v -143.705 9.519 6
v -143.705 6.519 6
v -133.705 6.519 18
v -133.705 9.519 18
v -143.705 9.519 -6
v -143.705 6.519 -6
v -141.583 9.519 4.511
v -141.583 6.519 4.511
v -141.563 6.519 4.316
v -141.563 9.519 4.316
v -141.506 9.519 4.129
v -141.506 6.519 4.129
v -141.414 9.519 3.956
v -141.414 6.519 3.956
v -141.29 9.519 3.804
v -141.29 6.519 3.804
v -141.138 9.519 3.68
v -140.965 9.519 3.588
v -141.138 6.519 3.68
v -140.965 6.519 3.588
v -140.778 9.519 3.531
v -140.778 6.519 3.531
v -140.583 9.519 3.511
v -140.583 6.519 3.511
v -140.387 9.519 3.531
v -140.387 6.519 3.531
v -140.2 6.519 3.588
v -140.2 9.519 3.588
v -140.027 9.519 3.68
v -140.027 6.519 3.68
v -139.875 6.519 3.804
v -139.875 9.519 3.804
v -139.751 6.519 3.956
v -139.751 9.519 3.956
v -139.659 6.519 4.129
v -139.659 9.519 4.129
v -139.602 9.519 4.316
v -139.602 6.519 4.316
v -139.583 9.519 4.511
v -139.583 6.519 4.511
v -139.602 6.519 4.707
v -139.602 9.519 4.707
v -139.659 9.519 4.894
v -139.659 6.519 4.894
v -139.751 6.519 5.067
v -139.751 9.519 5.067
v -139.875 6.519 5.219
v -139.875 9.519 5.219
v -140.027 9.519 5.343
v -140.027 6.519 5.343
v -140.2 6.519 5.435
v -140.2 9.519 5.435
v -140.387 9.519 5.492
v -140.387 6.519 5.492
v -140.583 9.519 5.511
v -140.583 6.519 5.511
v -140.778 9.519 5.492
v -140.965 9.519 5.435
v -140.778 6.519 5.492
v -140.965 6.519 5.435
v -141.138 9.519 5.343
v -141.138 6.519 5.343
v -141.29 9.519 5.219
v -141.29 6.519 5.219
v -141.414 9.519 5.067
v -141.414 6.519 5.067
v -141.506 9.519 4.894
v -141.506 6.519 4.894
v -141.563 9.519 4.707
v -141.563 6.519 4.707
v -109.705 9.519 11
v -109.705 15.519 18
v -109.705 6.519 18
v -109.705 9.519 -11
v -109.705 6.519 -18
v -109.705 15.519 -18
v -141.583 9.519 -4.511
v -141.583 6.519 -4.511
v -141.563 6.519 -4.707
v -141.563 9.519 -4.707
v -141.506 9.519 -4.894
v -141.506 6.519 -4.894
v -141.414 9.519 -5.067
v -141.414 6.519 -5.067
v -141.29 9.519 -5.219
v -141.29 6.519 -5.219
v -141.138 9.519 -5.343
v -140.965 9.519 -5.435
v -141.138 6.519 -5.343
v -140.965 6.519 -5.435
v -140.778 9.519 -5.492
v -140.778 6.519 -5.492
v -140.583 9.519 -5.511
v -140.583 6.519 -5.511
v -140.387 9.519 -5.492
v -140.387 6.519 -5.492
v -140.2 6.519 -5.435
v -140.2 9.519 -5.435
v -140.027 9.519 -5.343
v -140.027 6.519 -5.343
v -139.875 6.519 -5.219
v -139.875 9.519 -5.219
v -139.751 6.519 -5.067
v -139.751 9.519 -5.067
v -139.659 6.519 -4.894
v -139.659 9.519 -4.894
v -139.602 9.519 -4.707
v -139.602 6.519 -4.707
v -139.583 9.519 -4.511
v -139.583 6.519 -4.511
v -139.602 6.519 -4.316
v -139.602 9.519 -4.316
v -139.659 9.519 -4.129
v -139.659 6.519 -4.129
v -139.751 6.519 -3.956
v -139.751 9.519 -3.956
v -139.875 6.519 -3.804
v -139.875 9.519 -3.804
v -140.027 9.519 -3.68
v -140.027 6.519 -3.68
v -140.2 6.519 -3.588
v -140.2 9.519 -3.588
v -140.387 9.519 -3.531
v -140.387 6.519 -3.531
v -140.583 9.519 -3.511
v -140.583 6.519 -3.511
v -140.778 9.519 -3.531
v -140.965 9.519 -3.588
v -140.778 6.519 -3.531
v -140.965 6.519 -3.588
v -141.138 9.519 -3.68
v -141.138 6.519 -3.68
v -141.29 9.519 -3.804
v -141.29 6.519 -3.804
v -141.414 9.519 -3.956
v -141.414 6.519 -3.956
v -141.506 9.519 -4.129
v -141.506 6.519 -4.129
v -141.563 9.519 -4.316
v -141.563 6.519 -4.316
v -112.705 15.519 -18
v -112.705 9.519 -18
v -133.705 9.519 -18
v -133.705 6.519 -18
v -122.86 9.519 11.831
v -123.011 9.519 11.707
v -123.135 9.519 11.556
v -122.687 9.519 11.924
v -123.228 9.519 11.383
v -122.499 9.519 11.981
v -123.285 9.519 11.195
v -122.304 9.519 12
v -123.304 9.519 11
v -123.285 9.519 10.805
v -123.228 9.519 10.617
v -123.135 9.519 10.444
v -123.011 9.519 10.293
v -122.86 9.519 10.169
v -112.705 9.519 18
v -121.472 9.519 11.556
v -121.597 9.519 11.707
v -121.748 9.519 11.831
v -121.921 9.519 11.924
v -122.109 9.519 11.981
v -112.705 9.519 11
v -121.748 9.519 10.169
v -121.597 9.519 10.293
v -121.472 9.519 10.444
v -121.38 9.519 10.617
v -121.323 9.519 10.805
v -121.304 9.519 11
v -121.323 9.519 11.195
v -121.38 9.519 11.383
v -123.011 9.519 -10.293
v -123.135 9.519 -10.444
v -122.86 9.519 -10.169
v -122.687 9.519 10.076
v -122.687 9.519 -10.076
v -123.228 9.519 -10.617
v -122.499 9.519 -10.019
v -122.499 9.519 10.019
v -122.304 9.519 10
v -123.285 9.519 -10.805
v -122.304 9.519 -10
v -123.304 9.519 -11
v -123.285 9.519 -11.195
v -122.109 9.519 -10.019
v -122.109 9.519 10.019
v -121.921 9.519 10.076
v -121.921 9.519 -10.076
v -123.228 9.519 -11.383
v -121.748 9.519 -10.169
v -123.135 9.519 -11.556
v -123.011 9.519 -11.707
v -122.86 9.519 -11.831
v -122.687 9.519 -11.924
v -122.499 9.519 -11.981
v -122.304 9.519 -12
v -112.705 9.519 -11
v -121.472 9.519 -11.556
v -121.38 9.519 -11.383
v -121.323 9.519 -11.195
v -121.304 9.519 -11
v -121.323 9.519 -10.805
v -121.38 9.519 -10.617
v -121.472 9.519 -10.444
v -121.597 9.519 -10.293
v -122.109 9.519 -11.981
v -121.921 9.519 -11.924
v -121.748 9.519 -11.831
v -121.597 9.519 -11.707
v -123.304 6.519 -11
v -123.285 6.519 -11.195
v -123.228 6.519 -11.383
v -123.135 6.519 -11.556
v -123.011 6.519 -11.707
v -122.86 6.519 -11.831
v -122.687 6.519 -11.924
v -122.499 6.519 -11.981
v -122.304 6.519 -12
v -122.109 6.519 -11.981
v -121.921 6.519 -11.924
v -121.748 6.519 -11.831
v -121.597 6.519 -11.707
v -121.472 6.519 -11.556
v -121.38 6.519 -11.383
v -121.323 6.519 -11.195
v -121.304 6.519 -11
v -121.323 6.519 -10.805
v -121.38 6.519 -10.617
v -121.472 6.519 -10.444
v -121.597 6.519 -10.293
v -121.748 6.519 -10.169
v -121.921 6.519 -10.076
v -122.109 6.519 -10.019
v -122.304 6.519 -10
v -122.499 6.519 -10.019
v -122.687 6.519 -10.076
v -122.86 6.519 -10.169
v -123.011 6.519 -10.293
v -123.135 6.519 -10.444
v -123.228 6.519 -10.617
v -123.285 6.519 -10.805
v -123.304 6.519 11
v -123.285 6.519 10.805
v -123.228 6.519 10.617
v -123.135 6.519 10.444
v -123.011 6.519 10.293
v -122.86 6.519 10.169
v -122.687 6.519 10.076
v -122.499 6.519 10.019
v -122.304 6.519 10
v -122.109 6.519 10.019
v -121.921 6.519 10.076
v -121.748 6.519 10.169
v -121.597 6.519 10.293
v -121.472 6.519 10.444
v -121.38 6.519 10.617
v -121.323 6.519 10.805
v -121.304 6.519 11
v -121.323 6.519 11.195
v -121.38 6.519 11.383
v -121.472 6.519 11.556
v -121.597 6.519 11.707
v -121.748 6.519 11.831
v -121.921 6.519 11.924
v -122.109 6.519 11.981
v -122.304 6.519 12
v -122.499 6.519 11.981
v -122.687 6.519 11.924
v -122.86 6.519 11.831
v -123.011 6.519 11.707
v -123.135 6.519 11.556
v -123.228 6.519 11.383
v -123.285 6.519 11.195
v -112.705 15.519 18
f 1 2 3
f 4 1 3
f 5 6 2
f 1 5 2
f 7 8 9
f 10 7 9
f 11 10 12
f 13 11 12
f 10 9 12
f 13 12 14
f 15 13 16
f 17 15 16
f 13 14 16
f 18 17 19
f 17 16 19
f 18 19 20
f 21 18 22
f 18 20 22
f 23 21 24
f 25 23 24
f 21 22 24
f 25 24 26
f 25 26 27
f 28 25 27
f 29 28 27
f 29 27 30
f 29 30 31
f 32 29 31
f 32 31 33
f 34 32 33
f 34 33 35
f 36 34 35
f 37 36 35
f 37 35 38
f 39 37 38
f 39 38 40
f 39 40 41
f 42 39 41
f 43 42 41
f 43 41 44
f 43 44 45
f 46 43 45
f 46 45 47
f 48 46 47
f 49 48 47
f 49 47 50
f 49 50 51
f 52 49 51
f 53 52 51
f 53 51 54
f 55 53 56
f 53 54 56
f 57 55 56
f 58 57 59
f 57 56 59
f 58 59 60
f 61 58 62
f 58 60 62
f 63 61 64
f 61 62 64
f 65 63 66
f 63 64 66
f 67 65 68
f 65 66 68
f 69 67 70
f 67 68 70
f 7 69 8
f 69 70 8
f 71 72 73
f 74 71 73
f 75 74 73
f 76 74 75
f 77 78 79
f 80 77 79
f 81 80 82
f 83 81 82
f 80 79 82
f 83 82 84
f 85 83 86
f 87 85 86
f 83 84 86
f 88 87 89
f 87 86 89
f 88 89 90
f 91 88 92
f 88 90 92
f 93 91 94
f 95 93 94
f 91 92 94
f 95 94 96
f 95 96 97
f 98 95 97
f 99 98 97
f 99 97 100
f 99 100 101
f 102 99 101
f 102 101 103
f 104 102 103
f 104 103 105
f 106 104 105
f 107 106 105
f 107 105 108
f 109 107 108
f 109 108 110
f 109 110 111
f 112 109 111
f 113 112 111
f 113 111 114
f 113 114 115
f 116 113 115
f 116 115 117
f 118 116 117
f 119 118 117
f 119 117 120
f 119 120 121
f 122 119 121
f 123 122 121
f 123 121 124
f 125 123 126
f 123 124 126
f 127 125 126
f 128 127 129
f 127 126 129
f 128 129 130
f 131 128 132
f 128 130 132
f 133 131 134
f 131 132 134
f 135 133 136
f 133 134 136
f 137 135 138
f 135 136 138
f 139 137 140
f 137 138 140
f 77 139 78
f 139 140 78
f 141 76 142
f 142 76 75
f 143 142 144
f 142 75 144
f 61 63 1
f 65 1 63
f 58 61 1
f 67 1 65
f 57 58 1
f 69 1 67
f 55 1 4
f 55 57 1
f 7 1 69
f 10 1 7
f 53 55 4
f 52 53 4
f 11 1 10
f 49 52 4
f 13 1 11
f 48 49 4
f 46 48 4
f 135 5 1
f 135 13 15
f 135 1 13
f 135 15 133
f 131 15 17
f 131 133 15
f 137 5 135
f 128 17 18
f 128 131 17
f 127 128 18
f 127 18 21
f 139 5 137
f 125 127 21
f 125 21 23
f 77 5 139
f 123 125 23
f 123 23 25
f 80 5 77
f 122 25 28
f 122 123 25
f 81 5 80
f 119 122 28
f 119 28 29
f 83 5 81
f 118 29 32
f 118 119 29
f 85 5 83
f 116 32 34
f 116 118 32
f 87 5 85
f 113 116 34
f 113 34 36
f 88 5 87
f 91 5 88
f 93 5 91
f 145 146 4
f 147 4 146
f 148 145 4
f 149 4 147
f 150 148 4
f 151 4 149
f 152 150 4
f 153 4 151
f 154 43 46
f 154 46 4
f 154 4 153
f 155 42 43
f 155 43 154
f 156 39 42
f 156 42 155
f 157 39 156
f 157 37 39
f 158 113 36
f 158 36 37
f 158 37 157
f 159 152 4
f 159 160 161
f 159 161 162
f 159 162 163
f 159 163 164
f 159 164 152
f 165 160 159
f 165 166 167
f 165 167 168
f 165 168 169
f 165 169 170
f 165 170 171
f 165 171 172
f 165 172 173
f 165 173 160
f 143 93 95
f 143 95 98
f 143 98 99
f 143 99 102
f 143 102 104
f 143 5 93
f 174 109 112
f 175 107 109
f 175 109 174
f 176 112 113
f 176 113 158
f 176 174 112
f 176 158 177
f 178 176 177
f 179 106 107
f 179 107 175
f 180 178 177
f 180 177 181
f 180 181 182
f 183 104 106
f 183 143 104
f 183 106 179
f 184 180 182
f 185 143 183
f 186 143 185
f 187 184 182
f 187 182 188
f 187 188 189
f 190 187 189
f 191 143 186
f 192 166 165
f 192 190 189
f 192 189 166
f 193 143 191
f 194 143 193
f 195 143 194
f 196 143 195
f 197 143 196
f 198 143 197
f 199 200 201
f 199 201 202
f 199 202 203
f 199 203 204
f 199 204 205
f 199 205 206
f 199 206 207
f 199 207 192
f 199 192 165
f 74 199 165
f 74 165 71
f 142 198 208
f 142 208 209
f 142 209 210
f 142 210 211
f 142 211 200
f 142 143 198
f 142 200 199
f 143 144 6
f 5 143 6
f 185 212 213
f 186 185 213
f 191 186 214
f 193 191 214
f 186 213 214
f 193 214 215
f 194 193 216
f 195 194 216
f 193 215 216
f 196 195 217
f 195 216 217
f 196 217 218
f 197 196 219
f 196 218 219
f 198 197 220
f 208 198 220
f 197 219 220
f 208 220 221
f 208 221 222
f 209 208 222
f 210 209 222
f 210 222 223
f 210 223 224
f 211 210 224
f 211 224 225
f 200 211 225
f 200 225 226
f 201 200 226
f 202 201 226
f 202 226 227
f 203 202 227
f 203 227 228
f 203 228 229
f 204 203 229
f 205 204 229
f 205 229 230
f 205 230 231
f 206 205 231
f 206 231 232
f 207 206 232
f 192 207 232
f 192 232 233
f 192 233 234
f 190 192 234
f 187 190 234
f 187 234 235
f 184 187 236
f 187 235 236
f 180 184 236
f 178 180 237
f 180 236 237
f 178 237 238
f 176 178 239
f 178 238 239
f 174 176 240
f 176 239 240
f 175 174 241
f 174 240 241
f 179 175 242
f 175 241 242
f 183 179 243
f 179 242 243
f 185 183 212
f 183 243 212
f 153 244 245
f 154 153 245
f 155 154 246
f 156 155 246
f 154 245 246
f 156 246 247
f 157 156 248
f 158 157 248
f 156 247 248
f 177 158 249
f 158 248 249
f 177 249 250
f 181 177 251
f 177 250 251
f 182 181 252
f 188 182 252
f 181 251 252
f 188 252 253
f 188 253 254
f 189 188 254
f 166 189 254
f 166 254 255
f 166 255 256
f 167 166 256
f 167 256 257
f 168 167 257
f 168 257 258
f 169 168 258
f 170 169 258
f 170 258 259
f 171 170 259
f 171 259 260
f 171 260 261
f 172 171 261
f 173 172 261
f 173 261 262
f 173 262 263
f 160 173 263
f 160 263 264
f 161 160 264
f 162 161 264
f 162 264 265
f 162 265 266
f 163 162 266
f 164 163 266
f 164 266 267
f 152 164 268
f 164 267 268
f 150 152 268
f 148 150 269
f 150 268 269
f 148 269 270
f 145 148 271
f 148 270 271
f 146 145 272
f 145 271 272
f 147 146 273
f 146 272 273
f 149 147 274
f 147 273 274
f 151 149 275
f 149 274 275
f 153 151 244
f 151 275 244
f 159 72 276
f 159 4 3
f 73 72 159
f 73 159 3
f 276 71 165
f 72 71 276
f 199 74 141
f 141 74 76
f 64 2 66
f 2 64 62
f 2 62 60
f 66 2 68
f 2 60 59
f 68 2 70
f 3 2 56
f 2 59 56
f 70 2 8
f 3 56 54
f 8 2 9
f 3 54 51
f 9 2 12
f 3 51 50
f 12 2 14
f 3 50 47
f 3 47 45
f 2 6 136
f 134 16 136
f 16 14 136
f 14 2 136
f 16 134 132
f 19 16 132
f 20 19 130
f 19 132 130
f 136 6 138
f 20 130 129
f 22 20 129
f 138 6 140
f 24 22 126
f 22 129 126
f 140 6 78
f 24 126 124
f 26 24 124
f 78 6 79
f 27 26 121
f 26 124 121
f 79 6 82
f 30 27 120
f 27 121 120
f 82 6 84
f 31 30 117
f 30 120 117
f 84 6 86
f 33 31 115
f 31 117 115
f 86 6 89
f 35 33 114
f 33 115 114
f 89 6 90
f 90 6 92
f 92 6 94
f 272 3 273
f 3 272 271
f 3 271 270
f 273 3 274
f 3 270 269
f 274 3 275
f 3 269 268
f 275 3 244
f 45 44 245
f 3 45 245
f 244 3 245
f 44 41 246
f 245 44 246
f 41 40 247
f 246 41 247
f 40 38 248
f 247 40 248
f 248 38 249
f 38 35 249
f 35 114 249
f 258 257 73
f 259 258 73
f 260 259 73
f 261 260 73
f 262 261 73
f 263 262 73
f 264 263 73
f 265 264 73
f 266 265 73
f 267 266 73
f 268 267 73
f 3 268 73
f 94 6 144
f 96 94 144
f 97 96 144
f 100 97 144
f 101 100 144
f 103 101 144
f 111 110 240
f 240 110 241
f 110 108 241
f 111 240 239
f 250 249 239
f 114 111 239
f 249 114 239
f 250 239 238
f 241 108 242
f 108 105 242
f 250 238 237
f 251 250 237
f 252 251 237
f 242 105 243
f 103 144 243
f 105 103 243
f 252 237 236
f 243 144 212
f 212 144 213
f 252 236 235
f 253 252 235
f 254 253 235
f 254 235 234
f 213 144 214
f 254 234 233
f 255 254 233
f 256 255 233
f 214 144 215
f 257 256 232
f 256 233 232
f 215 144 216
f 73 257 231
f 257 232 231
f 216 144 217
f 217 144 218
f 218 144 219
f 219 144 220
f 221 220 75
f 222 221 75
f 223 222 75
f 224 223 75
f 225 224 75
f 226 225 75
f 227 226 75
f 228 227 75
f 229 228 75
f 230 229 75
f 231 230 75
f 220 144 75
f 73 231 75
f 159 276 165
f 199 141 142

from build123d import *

# Parameters (mm, degrees)
BOSS_EXTRUDE1_DEPTH   = 15
F_1_0MM_DOWEL_HOLE1_D = 10
BOSS_EXTRUDE2_DEPTH   = 15
ESCALA1_SCALE         = 0.2


with BuildPart() as part:
    # Sketch2 → Boss-Extrude1 (new body)
    with BuildSketch(Plane(origin=(0, 0, 0), x_dir=(1, 0, 0), z_dir=(0, 1, 0))):
        Polygon((-220, 30), (-220, -30), (-170, -90), (-50, -90), (-50, 90), (-170, 90), align=None)
    extrude(amount=BOSS_EXTRUDE1_DEPTH)

    # Ø1.0mm Dowel Hole1 (through all)
    with Locations(Plane(origin=(0, 15, 0), x_dir=(1, 0, 0), z_dir=(0, 1, 0))):
        with Locations((-204.389232105, 22.557395049), (-204.389232105, -22.557395049), (-112.996294866, 55), (-112.996294866, -55)):
            Hole(F_1_0MM_DOWEL_HOLE1_D / 2)

    # Sketch5 → Boss-Extrude2 (add)
    with BuildSketch(Plane(origin=(-50, 0, 0), x_dir=(0, 0, -1), z_dir=(1, 0, 0))):
        Polygon((-90, 15), (-55, 15), (-90, 45), align=None)
        Polygon((90, 45), (90, 15), (55, 15), align=None)
    extrude(amount=-BOSS_EXTRUDE2_DEPTH)


with BuildPart() as part_1:
    # Escala1: scaled about (-124.630859944, 8.148472024, 0)
    add(part.part.scale(ESCALA1_SCALE).moved(Location((-99.704687955, 6.518777619, 0))))


solid = part_1.part
